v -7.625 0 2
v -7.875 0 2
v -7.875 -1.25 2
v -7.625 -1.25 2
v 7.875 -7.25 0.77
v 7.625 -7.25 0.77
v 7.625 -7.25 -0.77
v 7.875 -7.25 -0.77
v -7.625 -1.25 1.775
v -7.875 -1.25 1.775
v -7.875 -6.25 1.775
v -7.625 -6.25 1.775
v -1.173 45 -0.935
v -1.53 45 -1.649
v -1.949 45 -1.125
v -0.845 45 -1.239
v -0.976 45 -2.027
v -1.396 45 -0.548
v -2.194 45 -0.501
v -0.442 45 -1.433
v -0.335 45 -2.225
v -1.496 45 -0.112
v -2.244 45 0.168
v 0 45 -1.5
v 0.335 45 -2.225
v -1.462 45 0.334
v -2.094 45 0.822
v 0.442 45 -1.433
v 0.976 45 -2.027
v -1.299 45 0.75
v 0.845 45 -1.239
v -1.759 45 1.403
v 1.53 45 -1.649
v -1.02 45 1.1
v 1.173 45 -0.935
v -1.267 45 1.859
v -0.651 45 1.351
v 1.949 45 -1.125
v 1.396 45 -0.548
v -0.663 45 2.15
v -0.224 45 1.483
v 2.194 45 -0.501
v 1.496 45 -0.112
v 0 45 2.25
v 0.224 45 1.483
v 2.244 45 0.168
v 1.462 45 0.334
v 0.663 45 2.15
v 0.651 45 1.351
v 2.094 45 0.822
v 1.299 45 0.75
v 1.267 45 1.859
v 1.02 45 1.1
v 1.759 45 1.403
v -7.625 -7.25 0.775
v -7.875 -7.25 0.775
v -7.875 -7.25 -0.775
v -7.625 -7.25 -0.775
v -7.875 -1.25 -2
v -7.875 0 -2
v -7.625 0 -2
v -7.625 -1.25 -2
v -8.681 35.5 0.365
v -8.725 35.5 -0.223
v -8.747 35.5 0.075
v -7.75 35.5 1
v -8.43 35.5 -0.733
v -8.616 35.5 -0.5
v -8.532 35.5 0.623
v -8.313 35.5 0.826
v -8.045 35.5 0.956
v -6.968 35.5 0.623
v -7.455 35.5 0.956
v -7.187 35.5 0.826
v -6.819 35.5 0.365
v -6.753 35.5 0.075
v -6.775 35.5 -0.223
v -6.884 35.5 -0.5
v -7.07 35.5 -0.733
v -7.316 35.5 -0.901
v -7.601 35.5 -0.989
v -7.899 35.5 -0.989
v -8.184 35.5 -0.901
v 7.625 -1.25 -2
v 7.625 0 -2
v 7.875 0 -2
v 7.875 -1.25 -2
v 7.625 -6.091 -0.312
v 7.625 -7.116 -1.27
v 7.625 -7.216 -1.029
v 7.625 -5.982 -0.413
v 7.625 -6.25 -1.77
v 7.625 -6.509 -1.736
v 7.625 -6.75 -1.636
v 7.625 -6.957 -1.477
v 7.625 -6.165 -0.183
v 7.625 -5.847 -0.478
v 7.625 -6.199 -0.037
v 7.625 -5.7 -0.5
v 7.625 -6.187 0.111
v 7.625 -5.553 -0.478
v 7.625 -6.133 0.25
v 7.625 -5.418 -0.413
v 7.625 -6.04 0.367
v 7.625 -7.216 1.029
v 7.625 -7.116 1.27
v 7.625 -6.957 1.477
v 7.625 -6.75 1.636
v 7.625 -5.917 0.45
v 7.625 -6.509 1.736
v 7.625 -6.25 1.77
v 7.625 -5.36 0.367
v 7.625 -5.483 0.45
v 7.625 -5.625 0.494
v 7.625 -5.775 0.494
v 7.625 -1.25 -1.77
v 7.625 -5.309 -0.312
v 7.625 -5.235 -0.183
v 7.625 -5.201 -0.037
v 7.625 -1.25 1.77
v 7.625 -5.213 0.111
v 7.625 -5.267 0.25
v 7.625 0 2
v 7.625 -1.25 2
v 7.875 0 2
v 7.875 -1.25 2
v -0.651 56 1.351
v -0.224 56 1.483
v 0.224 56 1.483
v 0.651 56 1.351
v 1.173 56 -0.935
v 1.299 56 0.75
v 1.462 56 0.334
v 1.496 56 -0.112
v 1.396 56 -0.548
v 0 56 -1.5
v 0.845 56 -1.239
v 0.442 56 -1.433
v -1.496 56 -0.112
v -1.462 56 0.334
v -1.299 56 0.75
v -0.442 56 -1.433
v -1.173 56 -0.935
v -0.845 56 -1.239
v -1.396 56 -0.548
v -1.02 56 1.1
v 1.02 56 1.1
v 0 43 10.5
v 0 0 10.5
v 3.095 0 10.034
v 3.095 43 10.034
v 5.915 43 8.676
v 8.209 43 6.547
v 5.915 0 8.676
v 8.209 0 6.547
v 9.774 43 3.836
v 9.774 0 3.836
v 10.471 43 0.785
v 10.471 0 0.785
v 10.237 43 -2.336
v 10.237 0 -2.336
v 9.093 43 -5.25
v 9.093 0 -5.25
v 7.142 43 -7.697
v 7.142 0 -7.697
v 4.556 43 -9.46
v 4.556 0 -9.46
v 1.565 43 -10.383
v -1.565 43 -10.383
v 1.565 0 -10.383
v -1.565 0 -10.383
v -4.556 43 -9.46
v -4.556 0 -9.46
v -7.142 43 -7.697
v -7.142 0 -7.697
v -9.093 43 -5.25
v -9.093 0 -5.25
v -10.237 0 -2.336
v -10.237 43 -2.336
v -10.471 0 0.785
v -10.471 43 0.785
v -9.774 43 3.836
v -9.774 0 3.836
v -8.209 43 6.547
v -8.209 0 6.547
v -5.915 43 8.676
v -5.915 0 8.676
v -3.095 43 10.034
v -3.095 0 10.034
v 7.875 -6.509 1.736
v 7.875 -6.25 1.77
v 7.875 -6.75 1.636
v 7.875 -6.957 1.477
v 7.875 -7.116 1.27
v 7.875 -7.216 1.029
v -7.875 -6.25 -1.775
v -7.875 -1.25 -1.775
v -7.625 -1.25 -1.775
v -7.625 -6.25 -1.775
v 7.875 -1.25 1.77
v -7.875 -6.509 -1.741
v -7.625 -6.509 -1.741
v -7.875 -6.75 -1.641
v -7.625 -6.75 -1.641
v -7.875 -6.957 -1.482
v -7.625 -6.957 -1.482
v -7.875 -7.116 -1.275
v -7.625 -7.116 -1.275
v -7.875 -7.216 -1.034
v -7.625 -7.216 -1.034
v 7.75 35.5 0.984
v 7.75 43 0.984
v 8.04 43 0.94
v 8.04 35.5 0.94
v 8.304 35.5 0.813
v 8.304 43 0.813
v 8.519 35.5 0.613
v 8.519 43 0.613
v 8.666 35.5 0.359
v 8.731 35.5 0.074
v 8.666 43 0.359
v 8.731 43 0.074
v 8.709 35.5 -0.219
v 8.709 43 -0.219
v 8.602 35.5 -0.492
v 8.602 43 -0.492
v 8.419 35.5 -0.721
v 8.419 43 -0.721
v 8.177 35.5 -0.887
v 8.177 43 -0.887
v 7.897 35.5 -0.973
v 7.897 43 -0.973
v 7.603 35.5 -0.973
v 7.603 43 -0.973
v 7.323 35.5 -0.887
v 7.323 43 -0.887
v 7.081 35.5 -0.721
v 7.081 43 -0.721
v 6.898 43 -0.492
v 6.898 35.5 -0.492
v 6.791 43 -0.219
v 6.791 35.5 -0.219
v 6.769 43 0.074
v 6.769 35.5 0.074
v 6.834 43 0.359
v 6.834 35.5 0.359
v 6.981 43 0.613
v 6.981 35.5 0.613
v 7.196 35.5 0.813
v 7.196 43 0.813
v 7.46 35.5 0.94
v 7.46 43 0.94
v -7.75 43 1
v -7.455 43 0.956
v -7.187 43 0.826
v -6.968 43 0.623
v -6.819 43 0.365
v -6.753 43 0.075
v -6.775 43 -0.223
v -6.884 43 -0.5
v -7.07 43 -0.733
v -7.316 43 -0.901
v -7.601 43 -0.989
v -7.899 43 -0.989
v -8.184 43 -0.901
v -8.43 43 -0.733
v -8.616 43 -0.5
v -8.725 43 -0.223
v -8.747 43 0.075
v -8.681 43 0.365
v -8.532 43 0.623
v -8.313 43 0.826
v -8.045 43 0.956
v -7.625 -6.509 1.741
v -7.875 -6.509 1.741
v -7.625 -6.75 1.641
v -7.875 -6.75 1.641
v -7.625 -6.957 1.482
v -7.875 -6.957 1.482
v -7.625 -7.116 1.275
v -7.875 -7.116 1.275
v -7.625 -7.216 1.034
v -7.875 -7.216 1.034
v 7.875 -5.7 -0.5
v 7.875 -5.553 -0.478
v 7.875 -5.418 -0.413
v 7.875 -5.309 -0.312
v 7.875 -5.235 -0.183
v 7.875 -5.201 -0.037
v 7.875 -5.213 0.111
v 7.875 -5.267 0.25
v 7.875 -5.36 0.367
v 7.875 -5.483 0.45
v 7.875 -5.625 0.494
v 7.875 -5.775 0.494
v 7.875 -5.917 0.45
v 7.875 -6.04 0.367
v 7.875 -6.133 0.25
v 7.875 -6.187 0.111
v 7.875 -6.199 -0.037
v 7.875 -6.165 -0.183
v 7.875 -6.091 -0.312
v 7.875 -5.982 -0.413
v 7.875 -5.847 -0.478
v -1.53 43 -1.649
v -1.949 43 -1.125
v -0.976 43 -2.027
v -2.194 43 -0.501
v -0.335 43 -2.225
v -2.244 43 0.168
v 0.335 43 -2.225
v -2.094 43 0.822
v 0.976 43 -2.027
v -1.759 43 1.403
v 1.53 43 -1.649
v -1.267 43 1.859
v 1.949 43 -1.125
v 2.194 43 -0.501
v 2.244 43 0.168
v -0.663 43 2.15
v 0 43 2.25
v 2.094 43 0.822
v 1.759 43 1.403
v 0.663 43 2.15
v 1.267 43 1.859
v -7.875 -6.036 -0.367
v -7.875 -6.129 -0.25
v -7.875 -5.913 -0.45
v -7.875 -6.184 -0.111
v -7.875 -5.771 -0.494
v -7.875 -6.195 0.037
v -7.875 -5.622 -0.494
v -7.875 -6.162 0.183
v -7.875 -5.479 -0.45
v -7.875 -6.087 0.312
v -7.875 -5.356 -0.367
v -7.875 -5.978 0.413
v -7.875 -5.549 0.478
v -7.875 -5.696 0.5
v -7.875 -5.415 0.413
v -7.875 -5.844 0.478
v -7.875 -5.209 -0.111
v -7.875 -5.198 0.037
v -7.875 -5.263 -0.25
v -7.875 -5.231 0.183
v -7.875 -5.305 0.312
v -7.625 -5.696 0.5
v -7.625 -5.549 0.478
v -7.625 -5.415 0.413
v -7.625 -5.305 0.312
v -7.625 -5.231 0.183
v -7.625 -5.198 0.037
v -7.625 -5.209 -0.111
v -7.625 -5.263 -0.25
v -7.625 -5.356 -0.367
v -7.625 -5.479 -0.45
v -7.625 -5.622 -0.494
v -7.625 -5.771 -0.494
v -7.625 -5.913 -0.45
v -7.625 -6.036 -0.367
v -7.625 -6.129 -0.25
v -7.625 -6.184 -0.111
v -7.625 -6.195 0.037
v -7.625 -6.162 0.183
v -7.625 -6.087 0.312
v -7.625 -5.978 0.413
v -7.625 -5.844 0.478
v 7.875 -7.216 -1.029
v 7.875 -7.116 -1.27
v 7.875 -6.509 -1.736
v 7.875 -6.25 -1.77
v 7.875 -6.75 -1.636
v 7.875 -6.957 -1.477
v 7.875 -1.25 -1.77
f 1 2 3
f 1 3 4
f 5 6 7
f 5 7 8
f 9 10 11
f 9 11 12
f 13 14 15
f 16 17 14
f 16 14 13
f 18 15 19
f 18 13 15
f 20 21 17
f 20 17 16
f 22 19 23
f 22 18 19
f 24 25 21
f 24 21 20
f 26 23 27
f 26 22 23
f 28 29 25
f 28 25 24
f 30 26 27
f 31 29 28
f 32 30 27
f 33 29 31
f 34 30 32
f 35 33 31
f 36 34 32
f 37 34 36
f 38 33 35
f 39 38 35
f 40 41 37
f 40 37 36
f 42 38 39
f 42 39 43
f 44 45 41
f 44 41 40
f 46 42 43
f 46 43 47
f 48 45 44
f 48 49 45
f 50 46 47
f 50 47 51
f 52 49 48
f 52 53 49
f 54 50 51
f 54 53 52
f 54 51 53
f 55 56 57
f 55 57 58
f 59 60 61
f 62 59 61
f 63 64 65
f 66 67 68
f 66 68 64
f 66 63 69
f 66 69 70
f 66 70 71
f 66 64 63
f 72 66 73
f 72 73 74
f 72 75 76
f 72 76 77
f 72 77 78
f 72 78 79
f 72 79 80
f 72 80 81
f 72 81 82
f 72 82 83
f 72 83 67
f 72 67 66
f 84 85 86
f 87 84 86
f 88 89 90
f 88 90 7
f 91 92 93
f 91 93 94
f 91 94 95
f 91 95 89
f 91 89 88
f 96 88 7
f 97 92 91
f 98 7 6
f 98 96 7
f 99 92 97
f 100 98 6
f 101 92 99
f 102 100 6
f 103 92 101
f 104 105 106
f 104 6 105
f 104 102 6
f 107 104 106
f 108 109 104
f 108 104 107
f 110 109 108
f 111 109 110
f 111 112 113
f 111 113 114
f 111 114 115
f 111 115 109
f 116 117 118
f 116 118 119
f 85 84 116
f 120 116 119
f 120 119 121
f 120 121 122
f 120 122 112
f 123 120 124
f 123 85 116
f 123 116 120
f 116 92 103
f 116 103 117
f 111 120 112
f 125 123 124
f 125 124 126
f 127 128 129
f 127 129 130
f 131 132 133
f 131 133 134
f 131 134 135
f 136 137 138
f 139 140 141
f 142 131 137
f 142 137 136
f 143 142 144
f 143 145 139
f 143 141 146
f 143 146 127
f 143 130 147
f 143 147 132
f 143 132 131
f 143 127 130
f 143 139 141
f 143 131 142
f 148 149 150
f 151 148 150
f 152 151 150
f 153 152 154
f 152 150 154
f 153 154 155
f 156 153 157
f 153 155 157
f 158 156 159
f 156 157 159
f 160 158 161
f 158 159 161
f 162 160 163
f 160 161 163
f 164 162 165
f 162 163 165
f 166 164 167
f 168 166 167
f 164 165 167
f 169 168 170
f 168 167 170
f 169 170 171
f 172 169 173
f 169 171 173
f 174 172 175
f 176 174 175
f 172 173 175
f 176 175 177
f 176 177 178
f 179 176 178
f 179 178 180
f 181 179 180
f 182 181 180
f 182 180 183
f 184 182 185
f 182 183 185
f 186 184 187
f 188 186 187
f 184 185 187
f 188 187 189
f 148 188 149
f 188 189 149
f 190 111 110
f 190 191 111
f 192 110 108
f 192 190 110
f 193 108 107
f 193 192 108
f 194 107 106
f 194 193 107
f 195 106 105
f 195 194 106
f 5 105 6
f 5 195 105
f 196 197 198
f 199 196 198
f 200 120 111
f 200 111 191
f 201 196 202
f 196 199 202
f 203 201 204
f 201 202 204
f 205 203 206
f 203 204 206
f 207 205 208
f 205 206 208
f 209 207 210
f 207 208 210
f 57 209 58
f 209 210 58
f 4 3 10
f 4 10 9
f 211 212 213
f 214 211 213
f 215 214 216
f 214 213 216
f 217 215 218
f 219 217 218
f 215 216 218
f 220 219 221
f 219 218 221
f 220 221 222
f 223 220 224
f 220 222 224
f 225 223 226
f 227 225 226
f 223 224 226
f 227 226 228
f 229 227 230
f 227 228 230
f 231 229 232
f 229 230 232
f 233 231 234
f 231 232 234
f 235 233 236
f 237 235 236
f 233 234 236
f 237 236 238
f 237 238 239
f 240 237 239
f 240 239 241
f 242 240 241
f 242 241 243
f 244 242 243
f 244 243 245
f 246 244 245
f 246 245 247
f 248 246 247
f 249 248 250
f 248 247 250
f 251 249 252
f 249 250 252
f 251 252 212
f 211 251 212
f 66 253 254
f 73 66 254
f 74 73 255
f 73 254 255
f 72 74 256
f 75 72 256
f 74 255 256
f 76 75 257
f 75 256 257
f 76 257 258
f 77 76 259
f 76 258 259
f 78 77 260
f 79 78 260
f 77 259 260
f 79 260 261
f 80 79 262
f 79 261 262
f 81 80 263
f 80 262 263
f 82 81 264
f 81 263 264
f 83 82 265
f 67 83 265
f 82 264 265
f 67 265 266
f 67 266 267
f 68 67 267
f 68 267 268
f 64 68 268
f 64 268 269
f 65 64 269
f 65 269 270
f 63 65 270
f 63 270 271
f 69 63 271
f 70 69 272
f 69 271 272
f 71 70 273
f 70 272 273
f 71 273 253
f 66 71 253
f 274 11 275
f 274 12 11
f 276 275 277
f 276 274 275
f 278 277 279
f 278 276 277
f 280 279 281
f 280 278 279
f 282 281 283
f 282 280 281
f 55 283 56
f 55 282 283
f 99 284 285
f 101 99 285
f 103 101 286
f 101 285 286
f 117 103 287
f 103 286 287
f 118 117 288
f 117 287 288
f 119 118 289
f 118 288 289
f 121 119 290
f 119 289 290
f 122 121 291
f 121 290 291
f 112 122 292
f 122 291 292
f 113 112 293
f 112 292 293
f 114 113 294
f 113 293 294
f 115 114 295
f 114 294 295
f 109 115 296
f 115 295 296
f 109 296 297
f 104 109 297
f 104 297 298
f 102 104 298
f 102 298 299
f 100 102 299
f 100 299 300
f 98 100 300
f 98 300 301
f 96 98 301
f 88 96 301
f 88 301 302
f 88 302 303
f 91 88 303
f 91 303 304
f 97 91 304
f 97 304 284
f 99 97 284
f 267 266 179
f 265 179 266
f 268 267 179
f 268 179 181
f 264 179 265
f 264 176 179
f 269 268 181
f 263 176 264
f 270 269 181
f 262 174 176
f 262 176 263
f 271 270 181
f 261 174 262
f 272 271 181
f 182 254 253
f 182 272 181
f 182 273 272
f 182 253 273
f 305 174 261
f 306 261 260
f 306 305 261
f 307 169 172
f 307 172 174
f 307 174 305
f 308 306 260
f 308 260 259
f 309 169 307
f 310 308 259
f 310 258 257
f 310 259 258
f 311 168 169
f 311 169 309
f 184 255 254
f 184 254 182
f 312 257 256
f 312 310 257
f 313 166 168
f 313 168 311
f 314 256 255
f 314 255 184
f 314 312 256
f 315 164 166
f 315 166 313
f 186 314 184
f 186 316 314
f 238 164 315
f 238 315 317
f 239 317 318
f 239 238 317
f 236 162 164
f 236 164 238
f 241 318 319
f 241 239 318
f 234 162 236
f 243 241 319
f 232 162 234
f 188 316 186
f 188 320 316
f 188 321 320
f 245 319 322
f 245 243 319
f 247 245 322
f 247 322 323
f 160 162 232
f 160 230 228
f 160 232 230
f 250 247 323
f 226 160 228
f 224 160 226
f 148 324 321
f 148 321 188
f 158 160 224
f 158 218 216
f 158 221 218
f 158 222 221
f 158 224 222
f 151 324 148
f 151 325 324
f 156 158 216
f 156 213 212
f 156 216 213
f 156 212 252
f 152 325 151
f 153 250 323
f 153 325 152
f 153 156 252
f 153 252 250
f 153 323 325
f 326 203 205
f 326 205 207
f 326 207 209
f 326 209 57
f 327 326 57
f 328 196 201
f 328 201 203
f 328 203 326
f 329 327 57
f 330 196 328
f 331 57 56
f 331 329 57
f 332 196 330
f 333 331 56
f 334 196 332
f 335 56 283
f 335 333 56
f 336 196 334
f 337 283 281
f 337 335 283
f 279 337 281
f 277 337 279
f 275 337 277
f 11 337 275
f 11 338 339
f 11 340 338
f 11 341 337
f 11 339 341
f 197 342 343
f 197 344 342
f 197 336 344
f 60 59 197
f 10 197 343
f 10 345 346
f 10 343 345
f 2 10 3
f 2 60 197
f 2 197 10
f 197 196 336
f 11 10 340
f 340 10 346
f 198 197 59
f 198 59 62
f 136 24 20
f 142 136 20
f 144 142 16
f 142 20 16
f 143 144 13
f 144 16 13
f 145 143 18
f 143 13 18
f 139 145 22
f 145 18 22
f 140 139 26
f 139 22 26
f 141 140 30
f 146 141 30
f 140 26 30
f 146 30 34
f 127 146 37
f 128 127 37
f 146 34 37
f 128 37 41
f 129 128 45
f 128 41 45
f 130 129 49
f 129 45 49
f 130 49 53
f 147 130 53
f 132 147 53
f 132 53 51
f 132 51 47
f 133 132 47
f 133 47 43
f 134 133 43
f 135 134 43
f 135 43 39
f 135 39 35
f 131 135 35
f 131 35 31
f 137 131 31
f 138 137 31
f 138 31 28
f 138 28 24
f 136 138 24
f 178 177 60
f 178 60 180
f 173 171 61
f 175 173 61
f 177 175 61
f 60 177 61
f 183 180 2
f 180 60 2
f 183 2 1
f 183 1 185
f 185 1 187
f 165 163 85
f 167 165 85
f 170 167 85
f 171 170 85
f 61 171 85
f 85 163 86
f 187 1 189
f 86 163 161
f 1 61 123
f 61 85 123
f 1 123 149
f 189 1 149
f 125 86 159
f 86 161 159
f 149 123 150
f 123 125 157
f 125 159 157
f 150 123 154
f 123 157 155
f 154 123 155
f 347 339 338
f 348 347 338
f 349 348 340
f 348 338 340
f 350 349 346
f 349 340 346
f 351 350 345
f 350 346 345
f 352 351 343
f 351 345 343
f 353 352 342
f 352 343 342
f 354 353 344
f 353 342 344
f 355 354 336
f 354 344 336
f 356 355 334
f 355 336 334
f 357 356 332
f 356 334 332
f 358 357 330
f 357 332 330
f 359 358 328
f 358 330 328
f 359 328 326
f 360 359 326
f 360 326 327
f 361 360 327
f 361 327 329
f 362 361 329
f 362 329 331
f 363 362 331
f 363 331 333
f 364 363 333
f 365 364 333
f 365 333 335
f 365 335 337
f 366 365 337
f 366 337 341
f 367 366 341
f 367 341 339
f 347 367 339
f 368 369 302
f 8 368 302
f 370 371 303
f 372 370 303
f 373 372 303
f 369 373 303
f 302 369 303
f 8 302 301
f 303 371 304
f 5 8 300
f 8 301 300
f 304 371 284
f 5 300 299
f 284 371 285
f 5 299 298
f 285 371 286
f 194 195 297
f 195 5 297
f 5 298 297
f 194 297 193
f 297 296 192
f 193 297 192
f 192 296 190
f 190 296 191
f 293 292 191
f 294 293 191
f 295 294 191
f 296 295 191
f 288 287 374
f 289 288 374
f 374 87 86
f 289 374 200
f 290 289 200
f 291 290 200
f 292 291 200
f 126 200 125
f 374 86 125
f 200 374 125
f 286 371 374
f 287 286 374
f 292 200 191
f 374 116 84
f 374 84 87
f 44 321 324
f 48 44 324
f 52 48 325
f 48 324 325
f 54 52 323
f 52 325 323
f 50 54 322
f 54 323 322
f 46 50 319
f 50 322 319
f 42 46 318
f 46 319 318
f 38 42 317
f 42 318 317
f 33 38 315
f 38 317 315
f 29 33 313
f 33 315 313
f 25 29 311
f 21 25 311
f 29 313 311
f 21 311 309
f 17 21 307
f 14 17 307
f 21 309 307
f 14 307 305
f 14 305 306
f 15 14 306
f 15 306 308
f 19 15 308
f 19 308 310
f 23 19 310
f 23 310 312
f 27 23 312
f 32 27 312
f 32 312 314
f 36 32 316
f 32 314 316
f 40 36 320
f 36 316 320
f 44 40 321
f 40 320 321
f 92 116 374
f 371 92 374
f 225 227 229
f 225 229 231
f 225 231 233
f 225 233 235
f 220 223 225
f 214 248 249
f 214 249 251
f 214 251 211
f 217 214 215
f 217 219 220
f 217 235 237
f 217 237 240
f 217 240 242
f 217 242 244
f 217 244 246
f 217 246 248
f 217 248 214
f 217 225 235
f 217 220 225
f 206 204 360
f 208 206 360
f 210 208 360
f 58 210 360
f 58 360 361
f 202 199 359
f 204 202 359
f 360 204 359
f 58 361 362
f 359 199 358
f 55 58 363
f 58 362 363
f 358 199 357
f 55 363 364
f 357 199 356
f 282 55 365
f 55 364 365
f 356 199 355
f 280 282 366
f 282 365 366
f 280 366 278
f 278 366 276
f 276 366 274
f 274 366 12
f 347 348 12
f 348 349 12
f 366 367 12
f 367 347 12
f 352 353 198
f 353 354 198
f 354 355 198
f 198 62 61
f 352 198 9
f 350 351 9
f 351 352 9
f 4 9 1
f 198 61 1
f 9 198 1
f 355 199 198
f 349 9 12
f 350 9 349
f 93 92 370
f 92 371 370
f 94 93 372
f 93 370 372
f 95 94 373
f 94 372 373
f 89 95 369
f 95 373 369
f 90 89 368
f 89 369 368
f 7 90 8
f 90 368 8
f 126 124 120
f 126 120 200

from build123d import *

# Parameters (mm, degrees)
SKETCH1_R           = 10.5
BOSS_EXTRUDE1_DEPTH = 43
SKETCH2_R           = 1.5
BOSS_EXTRUDE2_DEPTH = 13
SKETCH3_R           = 2.25
BOSS_EXTRUDE3_DEPTH = 2
SKETCH4_R           = 0.98394946
SKETCH4_R_2         = 1
CUT_EXTRUDE1_DEPTH  = 7.5
SKETCH5_W           = 0.25
SKETCH5_H           = 4
BOSS_EXTRUDE4_DEPTH = 1.25
SKETCH6_W           = 0.25
SKETCH6_H           = 3.55
BOSS_EXTRUDE5_DEPTH = 6
FILLET1_R           = 1
SKETCH7_R           = 0.5
CUT_EXTRUDE2_DEPTH  = 2
SKETCH8_W           = 0.25
SKETCH8_H           = 3.54
BOSS_EXTRUDE6_DEPTH = 6
FILLET2_R           = 1
SKETCH9_R           = 0.5
CUT_EXTRUDE3_DEPTH  = 3


with BuildPart() as part:
    # Sketch1 → Boss-Extrude1 (new body)
    with BuildSketch(Plane(origin=(0, 0, 0), x_dir=(1, 0, 0), z_dir=(0, 1, 0))):
        with Locations(Location((0, 0, 0), (0, 0, 270))):
            Circle(SKETCH1_R)
    extrude(amount=BOSS_EXTRUDE1_DEPTH)

    # Sketch2 → Boss-Extrude2 (add)
    with BuildSketch(Plane(origin=(0, 43, 0), x_dir=(1, 0, 0), z_dir=(0, 1, 0))):
        with Locations(Location((0, 0, 0), (0, 0, 90))):
            Circle(SKETCH2_R)
    extrude(amount=BOSS_EXTRUDE2_DEPTH)

    # Sketch3 → Boss-Extrude3 (add)
    with BuildSketch(Plane(origin=(0, 43, 0), x_dir=(1, 0, 0), z_dir=(0, 1, 0))):
        with Locations(Location((0, 0, 0), (0, 0, 270))):
            Circle(SKETCH3_R)
    extrude(amount=BOSS_EXTRUDE3_DEPTH)

    # Sketch4 → Cut-Extrude1 (cut)
    with BuildSketch(Plane(origin=(0, 43, 0), x_dir=(1, 0, 0), z_dir=(0, 1, 0))):
        with Locations(Location((7.75, 0, 0), (0, 0, 270))):
            Circle(SKETCH4_R)
        with Locations(Location((-7.75, 0, 0), (0, 0, 270))):
            Circle(SKETCH4_R_2)
    extrude(amount=-CUT_EXTRUDE1_DEPTH, mode=Mode.SUBTRACT)

    # Sketch5 → Boss-Extrude4 (add)
    with BuildSketch(Plane.XZ):
        with Locations((7.75, 0)):
            Rectangle(SKETCH5_W, SKETCH5_H)
        with Locations((-7.75, 0)):
            Rectangle(SKETCH5_W, SKETCH5_H)
    extrude(amount=BOSS_EXTRUDE4_DEPTH)

    # Sketch6 → Boss-Extrude5 (add)
    with BuildSketch(Plane.XZ.offset(1.25)):
        with Locations((-7.75, 0)):
            Rectangle(SKETCH6_W, SKETCH6_H)
    extrude(amount=BOSS_EXTRUDE5_DEPTH)

    # Fillet1
    fillet1_edges = [part.edges().sort_by_distance(p)[0] for p in [
        (-7.75, -7.25, 1.775),
        (-7.75, -7.25, -1.775),
    ]]
    fillet(fillet1_edges, radius=FILLET1_R)

    # Sketch7 → Cut-Extrude2 (cut)
    with BuildSketch(Plane.ZY.offset(7.875)):
        with Locations((0, -5.696270768)):
            Circle(SKETCH7_R)
    extrude(amount=-CUT_EXTRUDE2_DEPTH, mode=Mode.SUBTRACT)

    # Sketch8 → Boss-Extrude6 (add)
    with BuildSketch(Plane.XZ.offset(1.25)):
        with Locations((7.75, 0)):
            Rectangle(SKETCH8_W, SKETCH8_H)
    extrude(amount=BOSS_EXTRUDE6_DEPTH)

    # Fillet2
    fillet2_edges = [part.edges().sort_by_distance(p)[0] for p in [
        (7.75, -7.25, -1.77),
        (7.75, -7.25, 1.77),
    ]]
    fillet(fillet2_edges, radius=FILLET2_R)

    # Sketch9 → Cut-Extrude3 (cut)
    with BuildSketch(Plane(origin=(7.875, 0, 0), x_dir=(0, 0, -1), z_dir=(1, 0, 0))):
        with Locations((0, -5.7)):
            Circle(SKETCH9_R)
    extrude(amount=-CUT_EXTRUDE3_DEPTH, mode=Mode.SUBTRACT)


solid = part.part
